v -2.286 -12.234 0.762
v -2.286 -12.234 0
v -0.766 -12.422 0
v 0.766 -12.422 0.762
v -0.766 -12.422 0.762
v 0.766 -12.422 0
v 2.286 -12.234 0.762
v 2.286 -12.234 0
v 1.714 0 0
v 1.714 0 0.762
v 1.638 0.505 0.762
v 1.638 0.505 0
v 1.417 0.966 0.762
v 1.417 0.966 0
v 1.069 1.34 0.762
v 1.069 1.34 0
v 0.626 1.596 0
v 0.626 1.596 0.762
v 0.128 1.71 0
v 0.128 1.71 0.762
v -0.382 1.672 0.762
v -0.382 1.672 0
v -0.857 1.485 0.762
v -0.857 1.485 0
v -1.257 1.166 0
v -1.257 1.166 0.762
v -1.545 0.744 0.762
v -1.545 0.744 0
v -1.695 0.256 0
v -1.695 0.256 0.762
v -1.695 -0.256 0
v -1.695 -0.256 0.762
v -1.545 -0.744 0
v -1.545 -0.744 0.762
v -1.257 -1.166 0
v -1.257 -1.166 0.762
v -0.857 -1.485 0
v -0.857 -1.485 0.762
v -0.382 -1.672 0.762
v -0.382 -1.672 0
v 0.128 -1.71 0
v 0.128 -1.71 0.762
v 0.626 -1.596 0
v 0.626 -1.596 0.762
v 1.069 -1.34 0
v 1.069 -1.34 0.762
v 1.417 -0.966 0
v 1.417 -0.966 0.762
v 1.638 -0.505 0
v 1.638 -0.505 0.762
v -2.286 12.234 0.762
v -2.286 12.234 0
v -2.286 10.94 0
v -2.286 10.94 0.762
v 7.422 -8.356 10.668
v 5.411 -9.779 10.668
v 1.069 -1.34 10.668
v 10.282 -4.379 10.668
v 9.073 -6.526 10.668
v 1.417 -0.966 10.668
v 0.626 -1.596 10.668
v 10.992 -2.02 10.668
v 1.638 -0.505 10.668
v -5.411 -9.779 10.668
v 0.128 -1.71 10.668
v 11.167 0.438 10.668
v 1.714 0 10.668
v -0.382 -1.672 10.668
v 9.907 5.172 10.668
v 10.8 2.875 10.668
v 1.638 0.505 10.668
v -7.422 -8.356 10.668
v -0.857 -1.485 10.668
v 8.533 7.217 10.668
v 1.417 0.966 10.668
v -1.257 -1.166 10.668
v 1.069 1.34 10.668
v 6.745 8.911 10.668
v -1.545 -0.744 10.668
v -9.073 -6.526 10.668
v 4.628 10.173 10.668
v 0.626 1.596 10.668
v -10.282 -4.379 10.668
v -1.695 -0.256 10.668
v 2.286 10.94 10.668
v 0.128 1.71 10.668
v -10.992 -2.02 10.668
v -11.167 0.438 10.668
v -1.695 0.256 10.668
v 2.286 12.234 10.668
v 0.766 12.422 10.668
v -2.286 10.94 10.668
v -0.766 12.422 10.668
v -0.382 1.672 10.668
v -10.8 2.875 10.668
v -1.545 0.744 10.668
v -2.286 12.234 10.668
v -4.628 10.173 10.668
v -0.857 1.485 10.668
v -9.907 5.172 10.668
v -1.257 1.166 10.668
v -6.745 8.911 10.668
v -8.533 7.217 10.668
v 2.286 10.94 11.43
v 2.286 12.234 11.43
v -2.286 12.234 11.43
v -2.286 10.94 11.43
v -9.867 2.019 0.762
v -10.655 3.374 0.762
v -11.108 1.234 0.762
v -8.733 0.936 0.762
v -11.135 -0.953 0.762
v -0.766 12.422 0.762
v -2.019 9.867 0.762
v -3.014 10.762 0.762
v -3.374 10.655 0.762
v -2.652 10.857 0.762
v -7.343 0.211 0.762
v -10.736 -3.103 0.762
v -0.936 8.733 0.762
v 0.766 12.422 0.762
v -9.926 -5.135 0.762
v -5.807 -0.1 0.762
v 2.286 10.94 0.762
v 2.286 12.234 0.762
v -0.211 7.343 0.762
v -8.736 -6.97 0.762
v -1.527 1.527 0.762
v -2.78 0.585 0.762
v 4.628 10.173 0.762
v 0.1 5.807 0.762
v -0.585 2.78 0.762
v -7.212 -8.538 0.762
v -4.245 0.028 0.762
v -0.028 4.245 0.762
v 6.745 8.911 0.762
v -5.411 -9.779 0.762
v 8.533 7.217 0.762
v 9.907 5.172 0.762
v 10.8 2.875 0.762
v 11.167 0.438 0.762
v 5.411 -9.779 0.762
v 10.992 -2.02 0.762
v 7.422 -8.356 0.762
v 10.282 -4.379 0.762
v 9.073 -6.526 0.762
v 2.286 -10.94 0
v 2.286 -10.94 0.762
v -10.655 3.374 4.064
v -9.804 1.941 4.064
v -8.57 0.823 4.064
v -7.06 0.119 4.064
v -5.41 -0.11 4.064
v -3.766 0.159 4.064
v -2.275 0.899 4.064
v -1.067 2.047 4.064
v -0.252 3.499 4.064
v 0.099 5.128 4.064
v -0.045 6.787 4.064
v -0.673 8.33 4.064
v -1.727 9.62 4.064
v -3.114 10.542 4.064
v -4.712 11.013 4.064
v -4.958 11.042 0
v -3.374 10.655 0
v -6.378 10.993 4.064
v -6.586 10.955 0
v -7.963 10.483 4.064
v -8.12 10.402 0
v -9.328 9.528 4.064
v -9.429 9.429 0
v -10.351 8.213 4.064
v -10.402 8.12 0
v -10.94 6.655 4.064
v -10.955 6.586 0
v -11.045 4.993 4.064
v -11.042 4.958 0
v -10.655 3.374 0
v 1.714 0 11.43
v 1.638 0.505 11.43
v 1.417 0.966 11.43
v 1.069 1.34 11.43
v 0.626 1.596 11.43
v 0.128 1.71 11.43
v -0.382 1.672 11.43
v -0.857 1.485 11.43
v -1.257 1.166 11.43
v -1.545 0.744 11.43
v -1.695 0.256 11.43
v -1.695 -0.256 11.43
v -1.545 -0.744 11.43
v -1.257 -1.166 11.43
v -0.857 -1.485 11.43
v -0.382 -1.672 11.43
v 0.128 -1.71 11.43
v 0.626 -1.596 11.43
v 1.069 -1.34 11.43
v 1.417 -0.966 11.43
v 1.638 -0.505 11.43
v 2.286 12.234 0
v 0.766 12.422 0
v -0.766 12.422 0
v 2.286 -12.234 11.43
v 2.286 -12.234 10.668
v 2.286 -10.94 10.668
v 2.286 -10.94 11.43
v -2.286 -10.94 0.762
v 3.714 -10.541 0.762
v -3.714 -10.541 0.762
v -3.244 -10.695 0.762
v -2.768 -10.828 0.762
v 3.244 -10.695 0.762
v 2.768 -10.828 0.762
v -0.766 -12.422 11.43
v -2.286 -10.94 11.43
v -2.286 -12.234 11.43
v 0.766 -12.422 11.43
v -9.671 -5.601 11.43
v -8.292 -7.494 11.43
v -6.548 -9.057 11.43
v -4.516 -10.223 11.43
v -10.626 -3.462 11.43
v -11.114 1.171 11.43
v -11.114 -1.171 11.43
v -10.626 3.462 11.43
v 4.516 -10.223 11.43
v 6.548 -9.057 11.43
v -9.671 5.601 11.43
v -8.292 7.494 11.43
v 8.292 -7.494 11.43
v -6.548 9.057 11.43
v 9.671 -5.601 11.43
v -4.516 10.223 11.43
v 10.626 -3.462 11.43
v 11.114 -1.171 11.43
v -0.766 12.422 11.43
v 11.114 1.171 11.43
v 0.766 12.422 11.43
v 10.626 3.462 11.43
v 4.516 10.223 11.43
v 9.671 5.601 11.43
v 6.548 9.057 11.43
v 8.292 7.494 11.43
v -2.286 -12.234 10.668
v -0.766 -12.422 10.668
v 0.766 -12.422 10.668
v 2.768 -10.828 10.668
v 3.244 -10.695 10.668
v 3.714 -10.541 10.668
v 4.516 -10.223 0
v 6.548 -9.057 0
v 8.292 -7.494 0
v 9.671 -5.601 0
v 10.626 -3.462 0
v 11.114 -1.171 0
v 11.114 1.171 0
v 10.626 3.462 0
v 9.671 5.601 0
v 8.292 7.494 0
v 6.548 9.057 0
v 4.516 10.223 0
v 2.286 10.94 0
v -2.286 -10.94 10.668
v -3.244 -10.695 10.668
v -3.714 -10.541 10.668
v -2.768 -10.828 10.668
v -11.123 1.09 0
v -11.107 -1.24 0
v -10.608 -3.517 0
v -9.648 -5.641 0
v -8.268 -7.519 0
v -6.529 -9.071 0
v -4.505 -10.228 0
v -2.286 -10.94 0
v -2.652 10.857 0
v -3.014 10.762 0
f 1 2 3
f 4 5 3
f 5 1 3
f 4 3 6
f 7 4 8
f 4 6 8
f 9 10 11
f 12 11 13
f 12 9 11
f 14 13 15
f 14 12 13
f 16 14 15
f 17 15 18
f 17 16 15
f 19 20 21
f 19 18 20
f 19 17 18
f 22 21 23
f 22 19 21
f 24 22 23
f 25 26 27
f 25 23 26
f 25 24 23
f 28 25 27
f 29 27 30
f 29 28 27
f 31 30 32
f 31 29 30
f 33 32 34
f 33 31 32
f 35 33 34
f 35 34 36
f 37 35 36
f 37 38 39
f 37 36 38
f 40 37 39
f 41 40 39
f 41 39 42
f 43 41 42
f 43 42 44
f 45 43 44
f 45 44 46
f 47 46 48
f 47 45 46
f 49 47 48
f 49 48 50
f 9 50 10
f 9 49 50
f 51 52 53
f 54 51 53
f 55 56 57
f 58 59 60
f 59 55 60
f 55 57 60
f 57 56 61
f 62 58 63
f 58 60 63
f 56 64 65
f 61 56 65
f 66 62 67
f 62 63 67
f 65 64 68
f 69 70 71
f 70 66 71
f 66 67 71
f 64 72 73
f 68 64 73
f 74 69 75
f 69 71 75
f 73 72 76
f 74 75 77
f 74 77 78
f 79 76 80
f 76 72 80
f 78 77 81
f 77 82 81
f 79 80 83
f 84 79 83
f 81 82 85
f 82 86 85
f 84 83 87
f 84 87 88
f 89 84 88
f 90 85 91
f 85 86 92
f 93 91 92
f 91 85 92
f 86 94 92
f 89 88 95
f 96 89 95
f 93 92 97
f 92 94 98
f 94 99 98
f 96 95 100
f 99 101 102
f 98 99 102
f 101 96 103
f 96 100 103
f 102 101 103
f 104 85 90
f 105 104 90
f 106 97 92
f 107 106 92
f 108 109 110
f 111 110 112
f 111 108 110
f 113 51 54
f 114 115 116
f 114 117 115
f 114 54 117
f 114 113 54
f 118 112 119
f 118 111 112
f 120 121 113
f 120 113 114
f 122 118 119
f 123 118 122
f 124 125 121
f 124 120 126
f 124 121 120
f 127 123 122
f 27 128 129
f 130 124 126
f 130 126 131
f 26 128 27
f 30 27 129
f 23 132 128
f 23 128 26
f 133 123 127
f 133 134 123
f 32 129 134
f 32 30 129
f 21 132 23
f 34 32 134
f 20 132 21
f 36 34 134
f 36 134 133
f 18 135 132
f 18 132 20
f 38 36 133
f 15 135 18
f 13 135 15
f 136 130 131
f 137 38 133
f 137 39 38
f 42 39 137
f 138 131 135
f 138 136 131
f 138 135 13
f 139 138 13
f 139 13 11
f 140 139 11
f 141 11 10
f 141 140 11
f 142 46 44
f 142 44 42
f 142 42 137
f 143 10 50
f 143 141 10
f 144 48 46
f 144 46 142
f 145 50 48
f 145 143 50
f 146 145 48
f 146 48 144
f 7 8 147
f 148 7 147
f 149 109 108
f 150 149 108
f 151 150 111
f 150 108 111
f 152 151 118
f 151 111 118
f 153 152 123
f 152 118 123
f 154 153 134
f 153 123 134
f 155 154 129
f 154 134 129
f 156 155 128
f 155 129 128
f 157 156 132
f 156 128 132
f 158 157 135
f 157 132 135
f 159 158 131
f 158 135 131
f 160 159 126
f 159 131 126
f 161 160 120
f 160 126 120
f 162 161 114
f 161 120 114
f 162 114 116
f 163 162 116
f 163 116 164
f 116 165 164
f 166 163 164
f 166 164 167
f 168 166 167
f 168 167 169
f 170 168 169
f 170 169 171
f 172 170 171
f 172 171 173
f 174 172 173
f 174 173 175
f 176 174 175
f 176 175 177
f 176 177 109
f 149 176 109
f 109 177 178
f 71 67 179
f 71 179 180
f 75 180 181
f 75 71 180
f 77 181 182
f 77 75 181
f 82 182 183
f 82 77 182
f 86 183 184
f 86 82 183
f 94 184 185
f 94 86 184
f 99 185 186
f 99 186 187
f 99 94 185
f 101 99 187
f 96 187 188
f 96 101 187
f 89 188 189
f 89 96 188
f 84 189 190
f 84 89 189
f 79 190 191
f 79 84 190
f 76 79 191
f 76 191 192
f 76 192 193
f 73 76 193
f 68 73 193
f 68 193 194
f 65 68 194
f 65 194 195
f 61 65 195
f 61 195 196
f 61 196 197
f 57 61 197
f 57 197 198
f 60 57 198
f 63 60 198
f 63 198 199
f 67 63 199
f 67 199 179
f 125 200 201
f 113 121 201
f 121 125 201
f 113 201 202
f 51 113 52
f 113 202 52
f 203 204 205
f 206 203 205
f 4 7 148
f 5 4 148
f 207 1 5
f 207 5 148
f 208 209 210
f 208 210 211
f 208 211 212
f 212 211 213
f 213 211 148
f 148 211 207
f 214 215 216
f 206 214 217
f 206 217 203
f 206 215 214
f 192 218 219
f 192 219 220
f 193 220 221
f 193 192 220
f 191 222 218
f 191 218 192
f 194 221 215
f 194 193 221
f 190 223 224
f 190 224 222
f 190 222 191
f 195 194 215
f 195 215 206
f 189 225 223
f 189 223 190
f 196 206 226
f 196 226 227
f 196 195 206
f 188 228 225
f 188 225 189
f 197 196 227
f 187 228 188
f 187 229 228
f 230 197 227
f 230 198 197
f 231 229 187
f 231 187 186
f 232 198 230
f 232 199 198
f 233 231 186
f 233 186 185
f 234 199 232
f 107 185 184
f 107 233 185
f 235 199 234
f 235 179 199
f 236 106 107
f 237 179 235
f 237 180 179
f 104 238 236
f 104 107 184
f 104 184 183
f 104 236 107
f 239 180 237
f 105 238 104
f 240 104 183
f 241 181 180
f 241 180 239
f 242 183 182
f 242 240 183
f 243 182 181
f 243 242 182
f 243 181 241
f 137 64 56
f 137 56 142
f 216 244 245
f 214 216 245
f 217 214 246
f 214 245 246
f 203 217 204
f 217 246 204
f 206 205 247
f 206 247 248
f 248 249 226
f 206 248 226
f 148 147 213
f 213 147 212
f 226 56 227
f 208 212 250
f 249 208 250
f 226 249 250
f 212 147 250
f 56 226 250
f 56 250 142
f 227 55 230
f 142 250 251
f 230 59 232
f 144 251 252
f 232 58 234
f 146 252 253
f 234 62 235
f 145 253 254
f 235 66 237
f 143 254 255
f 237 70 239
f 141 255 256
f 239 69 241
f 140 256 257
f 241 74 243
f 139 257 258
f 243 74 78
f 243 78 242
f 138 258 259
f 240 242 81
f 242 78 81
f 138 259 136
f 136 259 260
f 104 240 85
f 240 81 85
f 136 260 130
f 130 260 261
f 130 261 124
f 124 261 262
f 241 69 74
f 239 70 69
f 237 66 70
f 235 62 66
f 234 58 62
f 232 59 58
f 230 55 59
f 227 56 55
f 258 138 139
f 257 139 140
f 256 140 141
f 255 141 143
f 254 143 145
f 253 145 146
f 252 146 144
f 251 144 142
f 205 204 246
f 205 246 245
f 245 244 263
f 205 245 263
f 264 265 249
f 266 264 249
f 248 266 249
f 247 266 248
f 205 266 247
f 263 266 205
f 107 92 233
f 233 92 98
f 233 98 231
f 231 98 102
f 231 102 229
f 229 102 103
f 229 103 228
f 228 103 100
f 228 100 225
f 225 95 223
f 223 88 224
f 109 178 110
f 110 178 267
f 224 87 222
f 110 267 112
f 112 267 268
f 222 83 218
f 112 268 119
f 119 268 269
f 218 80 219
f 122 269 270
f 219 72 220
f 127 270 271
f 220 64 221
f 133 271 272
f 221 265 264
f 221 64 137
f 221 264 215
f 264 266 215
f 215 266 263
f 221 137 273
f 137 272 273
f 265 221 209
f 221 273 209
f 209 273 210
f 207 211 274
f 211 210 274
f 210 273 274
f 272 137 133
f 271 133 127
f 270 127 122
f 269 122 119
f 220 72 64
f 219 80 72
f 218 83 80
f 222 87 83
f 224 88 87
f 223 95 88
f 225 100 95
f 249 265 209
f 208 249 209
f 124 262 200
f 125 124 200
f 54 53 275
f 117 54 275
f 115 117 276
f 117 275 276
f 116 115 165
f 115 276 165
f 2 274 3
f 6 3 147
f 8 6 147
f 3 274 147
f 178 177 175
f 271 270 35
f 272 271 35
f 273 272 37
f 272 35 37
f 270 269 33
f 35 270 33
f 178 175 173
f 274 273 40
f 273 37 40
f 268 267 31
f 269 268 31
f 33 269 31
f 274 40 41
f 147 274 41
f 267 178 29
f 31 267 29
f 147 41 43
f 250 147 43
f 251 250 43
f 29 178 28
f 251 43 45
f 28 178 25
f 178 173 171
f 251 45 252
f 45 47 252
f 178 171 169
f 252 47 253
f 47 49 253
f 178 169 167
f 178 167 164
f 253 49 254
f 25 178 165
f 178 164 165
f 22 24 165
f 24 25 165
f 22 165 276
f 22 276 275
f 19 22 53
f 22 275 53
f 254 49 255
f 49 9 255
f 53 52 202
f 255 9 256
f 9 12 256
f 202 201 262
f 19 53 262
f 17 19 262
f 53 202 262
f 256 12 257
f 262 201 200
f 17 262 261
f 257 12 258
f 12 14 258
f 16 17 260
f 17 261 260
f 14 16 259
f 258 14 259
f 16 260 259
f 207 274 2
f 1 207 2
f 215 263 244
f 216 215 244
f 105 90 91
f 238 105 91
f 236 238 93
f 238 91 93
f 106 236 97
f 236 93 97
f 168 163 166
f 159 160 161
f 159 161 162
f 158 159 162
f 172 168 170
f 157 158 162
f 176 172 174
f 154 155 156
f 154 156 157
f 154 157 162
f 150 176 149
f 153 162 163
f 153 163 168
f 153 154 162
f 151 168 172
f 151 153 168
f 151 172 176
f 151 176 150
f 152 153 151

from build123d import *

# Parameters (mm, degrees)
SKETCH1_R               = 1.7145
BOSS_EXTRUDE1_DEPTH     = 11.43
SKETCH2_W               = 9.906
SKETCH2_H               = 2.54
CUT_EXTRUDE1_DEPTH      = 21.259585188
CUT_EXTRUDE1_DEPTH_BACK = 21.259585188
SKETCH4_W               = 9.906
SKETCH4_H               = 20.955
SKETCH4_H_2             = 0.635
SKETCH3_R               = 5.588
BOSS_EXTRUDE2_DEPTH     = 4.064


with BuildPart() as part:
    # Sketch1 → Boss-Extrude1 (new body)
    with BuildSketch(Plane.XY):
        with BuildLine():
            Line((-2.286, 12.234260092), (-2.286, 10.939706577))
            ThreePointArc((-2.286, 10.939706577), (-11.176, 0), (-2.286, -10.939706577))
            Line((-2.286, -10.939706577), (-2.286, -12.234260092))
            ThreePointArc((-2.286, -12.234260092), (0, -12.446), (2.286, -12.234260092))
            Line((2.286, -12.234260092), (2.286, -10.939706577))
            ThreePointArc((2.286, -10.939706577), (11.176, 0), (2.286, 10.939706577))
            Line((2.286, 10.939706577), (2.286, 12.234260092))
            ThreePointArc((2.286, 12.234260092), (0, 12.446), (-2.286, 12.234260092))
        make_face()
        Circle(SKETCH1_R, mode=Mode.SUBTRACT)
    extrude(amount=BOSS_EXTRUDE1_DEPTH)

    # Sketch2 → Cut-Revolve1 (revolve, cut)
    with BuildSketch(Plane(origin=(0, 0, 0), x_dir=(0, 0, -1), z_dir=(1, 0, 0)), mode=Mode.PRIVATE) as cut_revolve1_sk:
        with Locations((-5.715, 12.446)):
            Rectangle(SKETCH2_W, SKETCH2_H)
    revolve(cut_revolve1_sk.sketch.rotate(Axis((0, 0, 11.43), (0, 0, -1)), 348.19710831), axis=Axis((0, 0, 11.43), (0, 0, -1)), mode=Mode.SUBTRACT)

    # Sketch4 → Cut-Extrude1 (cut, two sides: drawn at the far end of the back side and taken through both)
    with BuildSketch(Plane(origin=(0, 0, 0), x_dir=(0, 0, -1), z_dir=(1, 0, 0)).offset(-CUT_EXTRUDE1_DEPTH_BACK)):
        with Locations((-5.715, 0.6985)):
            Rectangle(SKETCH4_W, SKETCH4_H)
        with Locations((-5.715, -10.8585)):
            Rectangle(SKETCH4_W, SKETCH4_H_2)
    extrude(amount=CUT_EXTRUDE1_DEPTH + CUT_EXTRUDE1_DEPTH_BACK, mode=Mode.SUBTRACT)

    # Sketch3 → Boss-Extrude2 (add)
    with BuildSketch(Plane.XY):
        with Locations(Location((-5.477956234, 5.477956234, 0), (0, 0, 202.121055782))):
            Circle(SKETCH3_R)
    extrude(amount=BOSS_EXTRUDE2_DEPTH)


solid = part.part
